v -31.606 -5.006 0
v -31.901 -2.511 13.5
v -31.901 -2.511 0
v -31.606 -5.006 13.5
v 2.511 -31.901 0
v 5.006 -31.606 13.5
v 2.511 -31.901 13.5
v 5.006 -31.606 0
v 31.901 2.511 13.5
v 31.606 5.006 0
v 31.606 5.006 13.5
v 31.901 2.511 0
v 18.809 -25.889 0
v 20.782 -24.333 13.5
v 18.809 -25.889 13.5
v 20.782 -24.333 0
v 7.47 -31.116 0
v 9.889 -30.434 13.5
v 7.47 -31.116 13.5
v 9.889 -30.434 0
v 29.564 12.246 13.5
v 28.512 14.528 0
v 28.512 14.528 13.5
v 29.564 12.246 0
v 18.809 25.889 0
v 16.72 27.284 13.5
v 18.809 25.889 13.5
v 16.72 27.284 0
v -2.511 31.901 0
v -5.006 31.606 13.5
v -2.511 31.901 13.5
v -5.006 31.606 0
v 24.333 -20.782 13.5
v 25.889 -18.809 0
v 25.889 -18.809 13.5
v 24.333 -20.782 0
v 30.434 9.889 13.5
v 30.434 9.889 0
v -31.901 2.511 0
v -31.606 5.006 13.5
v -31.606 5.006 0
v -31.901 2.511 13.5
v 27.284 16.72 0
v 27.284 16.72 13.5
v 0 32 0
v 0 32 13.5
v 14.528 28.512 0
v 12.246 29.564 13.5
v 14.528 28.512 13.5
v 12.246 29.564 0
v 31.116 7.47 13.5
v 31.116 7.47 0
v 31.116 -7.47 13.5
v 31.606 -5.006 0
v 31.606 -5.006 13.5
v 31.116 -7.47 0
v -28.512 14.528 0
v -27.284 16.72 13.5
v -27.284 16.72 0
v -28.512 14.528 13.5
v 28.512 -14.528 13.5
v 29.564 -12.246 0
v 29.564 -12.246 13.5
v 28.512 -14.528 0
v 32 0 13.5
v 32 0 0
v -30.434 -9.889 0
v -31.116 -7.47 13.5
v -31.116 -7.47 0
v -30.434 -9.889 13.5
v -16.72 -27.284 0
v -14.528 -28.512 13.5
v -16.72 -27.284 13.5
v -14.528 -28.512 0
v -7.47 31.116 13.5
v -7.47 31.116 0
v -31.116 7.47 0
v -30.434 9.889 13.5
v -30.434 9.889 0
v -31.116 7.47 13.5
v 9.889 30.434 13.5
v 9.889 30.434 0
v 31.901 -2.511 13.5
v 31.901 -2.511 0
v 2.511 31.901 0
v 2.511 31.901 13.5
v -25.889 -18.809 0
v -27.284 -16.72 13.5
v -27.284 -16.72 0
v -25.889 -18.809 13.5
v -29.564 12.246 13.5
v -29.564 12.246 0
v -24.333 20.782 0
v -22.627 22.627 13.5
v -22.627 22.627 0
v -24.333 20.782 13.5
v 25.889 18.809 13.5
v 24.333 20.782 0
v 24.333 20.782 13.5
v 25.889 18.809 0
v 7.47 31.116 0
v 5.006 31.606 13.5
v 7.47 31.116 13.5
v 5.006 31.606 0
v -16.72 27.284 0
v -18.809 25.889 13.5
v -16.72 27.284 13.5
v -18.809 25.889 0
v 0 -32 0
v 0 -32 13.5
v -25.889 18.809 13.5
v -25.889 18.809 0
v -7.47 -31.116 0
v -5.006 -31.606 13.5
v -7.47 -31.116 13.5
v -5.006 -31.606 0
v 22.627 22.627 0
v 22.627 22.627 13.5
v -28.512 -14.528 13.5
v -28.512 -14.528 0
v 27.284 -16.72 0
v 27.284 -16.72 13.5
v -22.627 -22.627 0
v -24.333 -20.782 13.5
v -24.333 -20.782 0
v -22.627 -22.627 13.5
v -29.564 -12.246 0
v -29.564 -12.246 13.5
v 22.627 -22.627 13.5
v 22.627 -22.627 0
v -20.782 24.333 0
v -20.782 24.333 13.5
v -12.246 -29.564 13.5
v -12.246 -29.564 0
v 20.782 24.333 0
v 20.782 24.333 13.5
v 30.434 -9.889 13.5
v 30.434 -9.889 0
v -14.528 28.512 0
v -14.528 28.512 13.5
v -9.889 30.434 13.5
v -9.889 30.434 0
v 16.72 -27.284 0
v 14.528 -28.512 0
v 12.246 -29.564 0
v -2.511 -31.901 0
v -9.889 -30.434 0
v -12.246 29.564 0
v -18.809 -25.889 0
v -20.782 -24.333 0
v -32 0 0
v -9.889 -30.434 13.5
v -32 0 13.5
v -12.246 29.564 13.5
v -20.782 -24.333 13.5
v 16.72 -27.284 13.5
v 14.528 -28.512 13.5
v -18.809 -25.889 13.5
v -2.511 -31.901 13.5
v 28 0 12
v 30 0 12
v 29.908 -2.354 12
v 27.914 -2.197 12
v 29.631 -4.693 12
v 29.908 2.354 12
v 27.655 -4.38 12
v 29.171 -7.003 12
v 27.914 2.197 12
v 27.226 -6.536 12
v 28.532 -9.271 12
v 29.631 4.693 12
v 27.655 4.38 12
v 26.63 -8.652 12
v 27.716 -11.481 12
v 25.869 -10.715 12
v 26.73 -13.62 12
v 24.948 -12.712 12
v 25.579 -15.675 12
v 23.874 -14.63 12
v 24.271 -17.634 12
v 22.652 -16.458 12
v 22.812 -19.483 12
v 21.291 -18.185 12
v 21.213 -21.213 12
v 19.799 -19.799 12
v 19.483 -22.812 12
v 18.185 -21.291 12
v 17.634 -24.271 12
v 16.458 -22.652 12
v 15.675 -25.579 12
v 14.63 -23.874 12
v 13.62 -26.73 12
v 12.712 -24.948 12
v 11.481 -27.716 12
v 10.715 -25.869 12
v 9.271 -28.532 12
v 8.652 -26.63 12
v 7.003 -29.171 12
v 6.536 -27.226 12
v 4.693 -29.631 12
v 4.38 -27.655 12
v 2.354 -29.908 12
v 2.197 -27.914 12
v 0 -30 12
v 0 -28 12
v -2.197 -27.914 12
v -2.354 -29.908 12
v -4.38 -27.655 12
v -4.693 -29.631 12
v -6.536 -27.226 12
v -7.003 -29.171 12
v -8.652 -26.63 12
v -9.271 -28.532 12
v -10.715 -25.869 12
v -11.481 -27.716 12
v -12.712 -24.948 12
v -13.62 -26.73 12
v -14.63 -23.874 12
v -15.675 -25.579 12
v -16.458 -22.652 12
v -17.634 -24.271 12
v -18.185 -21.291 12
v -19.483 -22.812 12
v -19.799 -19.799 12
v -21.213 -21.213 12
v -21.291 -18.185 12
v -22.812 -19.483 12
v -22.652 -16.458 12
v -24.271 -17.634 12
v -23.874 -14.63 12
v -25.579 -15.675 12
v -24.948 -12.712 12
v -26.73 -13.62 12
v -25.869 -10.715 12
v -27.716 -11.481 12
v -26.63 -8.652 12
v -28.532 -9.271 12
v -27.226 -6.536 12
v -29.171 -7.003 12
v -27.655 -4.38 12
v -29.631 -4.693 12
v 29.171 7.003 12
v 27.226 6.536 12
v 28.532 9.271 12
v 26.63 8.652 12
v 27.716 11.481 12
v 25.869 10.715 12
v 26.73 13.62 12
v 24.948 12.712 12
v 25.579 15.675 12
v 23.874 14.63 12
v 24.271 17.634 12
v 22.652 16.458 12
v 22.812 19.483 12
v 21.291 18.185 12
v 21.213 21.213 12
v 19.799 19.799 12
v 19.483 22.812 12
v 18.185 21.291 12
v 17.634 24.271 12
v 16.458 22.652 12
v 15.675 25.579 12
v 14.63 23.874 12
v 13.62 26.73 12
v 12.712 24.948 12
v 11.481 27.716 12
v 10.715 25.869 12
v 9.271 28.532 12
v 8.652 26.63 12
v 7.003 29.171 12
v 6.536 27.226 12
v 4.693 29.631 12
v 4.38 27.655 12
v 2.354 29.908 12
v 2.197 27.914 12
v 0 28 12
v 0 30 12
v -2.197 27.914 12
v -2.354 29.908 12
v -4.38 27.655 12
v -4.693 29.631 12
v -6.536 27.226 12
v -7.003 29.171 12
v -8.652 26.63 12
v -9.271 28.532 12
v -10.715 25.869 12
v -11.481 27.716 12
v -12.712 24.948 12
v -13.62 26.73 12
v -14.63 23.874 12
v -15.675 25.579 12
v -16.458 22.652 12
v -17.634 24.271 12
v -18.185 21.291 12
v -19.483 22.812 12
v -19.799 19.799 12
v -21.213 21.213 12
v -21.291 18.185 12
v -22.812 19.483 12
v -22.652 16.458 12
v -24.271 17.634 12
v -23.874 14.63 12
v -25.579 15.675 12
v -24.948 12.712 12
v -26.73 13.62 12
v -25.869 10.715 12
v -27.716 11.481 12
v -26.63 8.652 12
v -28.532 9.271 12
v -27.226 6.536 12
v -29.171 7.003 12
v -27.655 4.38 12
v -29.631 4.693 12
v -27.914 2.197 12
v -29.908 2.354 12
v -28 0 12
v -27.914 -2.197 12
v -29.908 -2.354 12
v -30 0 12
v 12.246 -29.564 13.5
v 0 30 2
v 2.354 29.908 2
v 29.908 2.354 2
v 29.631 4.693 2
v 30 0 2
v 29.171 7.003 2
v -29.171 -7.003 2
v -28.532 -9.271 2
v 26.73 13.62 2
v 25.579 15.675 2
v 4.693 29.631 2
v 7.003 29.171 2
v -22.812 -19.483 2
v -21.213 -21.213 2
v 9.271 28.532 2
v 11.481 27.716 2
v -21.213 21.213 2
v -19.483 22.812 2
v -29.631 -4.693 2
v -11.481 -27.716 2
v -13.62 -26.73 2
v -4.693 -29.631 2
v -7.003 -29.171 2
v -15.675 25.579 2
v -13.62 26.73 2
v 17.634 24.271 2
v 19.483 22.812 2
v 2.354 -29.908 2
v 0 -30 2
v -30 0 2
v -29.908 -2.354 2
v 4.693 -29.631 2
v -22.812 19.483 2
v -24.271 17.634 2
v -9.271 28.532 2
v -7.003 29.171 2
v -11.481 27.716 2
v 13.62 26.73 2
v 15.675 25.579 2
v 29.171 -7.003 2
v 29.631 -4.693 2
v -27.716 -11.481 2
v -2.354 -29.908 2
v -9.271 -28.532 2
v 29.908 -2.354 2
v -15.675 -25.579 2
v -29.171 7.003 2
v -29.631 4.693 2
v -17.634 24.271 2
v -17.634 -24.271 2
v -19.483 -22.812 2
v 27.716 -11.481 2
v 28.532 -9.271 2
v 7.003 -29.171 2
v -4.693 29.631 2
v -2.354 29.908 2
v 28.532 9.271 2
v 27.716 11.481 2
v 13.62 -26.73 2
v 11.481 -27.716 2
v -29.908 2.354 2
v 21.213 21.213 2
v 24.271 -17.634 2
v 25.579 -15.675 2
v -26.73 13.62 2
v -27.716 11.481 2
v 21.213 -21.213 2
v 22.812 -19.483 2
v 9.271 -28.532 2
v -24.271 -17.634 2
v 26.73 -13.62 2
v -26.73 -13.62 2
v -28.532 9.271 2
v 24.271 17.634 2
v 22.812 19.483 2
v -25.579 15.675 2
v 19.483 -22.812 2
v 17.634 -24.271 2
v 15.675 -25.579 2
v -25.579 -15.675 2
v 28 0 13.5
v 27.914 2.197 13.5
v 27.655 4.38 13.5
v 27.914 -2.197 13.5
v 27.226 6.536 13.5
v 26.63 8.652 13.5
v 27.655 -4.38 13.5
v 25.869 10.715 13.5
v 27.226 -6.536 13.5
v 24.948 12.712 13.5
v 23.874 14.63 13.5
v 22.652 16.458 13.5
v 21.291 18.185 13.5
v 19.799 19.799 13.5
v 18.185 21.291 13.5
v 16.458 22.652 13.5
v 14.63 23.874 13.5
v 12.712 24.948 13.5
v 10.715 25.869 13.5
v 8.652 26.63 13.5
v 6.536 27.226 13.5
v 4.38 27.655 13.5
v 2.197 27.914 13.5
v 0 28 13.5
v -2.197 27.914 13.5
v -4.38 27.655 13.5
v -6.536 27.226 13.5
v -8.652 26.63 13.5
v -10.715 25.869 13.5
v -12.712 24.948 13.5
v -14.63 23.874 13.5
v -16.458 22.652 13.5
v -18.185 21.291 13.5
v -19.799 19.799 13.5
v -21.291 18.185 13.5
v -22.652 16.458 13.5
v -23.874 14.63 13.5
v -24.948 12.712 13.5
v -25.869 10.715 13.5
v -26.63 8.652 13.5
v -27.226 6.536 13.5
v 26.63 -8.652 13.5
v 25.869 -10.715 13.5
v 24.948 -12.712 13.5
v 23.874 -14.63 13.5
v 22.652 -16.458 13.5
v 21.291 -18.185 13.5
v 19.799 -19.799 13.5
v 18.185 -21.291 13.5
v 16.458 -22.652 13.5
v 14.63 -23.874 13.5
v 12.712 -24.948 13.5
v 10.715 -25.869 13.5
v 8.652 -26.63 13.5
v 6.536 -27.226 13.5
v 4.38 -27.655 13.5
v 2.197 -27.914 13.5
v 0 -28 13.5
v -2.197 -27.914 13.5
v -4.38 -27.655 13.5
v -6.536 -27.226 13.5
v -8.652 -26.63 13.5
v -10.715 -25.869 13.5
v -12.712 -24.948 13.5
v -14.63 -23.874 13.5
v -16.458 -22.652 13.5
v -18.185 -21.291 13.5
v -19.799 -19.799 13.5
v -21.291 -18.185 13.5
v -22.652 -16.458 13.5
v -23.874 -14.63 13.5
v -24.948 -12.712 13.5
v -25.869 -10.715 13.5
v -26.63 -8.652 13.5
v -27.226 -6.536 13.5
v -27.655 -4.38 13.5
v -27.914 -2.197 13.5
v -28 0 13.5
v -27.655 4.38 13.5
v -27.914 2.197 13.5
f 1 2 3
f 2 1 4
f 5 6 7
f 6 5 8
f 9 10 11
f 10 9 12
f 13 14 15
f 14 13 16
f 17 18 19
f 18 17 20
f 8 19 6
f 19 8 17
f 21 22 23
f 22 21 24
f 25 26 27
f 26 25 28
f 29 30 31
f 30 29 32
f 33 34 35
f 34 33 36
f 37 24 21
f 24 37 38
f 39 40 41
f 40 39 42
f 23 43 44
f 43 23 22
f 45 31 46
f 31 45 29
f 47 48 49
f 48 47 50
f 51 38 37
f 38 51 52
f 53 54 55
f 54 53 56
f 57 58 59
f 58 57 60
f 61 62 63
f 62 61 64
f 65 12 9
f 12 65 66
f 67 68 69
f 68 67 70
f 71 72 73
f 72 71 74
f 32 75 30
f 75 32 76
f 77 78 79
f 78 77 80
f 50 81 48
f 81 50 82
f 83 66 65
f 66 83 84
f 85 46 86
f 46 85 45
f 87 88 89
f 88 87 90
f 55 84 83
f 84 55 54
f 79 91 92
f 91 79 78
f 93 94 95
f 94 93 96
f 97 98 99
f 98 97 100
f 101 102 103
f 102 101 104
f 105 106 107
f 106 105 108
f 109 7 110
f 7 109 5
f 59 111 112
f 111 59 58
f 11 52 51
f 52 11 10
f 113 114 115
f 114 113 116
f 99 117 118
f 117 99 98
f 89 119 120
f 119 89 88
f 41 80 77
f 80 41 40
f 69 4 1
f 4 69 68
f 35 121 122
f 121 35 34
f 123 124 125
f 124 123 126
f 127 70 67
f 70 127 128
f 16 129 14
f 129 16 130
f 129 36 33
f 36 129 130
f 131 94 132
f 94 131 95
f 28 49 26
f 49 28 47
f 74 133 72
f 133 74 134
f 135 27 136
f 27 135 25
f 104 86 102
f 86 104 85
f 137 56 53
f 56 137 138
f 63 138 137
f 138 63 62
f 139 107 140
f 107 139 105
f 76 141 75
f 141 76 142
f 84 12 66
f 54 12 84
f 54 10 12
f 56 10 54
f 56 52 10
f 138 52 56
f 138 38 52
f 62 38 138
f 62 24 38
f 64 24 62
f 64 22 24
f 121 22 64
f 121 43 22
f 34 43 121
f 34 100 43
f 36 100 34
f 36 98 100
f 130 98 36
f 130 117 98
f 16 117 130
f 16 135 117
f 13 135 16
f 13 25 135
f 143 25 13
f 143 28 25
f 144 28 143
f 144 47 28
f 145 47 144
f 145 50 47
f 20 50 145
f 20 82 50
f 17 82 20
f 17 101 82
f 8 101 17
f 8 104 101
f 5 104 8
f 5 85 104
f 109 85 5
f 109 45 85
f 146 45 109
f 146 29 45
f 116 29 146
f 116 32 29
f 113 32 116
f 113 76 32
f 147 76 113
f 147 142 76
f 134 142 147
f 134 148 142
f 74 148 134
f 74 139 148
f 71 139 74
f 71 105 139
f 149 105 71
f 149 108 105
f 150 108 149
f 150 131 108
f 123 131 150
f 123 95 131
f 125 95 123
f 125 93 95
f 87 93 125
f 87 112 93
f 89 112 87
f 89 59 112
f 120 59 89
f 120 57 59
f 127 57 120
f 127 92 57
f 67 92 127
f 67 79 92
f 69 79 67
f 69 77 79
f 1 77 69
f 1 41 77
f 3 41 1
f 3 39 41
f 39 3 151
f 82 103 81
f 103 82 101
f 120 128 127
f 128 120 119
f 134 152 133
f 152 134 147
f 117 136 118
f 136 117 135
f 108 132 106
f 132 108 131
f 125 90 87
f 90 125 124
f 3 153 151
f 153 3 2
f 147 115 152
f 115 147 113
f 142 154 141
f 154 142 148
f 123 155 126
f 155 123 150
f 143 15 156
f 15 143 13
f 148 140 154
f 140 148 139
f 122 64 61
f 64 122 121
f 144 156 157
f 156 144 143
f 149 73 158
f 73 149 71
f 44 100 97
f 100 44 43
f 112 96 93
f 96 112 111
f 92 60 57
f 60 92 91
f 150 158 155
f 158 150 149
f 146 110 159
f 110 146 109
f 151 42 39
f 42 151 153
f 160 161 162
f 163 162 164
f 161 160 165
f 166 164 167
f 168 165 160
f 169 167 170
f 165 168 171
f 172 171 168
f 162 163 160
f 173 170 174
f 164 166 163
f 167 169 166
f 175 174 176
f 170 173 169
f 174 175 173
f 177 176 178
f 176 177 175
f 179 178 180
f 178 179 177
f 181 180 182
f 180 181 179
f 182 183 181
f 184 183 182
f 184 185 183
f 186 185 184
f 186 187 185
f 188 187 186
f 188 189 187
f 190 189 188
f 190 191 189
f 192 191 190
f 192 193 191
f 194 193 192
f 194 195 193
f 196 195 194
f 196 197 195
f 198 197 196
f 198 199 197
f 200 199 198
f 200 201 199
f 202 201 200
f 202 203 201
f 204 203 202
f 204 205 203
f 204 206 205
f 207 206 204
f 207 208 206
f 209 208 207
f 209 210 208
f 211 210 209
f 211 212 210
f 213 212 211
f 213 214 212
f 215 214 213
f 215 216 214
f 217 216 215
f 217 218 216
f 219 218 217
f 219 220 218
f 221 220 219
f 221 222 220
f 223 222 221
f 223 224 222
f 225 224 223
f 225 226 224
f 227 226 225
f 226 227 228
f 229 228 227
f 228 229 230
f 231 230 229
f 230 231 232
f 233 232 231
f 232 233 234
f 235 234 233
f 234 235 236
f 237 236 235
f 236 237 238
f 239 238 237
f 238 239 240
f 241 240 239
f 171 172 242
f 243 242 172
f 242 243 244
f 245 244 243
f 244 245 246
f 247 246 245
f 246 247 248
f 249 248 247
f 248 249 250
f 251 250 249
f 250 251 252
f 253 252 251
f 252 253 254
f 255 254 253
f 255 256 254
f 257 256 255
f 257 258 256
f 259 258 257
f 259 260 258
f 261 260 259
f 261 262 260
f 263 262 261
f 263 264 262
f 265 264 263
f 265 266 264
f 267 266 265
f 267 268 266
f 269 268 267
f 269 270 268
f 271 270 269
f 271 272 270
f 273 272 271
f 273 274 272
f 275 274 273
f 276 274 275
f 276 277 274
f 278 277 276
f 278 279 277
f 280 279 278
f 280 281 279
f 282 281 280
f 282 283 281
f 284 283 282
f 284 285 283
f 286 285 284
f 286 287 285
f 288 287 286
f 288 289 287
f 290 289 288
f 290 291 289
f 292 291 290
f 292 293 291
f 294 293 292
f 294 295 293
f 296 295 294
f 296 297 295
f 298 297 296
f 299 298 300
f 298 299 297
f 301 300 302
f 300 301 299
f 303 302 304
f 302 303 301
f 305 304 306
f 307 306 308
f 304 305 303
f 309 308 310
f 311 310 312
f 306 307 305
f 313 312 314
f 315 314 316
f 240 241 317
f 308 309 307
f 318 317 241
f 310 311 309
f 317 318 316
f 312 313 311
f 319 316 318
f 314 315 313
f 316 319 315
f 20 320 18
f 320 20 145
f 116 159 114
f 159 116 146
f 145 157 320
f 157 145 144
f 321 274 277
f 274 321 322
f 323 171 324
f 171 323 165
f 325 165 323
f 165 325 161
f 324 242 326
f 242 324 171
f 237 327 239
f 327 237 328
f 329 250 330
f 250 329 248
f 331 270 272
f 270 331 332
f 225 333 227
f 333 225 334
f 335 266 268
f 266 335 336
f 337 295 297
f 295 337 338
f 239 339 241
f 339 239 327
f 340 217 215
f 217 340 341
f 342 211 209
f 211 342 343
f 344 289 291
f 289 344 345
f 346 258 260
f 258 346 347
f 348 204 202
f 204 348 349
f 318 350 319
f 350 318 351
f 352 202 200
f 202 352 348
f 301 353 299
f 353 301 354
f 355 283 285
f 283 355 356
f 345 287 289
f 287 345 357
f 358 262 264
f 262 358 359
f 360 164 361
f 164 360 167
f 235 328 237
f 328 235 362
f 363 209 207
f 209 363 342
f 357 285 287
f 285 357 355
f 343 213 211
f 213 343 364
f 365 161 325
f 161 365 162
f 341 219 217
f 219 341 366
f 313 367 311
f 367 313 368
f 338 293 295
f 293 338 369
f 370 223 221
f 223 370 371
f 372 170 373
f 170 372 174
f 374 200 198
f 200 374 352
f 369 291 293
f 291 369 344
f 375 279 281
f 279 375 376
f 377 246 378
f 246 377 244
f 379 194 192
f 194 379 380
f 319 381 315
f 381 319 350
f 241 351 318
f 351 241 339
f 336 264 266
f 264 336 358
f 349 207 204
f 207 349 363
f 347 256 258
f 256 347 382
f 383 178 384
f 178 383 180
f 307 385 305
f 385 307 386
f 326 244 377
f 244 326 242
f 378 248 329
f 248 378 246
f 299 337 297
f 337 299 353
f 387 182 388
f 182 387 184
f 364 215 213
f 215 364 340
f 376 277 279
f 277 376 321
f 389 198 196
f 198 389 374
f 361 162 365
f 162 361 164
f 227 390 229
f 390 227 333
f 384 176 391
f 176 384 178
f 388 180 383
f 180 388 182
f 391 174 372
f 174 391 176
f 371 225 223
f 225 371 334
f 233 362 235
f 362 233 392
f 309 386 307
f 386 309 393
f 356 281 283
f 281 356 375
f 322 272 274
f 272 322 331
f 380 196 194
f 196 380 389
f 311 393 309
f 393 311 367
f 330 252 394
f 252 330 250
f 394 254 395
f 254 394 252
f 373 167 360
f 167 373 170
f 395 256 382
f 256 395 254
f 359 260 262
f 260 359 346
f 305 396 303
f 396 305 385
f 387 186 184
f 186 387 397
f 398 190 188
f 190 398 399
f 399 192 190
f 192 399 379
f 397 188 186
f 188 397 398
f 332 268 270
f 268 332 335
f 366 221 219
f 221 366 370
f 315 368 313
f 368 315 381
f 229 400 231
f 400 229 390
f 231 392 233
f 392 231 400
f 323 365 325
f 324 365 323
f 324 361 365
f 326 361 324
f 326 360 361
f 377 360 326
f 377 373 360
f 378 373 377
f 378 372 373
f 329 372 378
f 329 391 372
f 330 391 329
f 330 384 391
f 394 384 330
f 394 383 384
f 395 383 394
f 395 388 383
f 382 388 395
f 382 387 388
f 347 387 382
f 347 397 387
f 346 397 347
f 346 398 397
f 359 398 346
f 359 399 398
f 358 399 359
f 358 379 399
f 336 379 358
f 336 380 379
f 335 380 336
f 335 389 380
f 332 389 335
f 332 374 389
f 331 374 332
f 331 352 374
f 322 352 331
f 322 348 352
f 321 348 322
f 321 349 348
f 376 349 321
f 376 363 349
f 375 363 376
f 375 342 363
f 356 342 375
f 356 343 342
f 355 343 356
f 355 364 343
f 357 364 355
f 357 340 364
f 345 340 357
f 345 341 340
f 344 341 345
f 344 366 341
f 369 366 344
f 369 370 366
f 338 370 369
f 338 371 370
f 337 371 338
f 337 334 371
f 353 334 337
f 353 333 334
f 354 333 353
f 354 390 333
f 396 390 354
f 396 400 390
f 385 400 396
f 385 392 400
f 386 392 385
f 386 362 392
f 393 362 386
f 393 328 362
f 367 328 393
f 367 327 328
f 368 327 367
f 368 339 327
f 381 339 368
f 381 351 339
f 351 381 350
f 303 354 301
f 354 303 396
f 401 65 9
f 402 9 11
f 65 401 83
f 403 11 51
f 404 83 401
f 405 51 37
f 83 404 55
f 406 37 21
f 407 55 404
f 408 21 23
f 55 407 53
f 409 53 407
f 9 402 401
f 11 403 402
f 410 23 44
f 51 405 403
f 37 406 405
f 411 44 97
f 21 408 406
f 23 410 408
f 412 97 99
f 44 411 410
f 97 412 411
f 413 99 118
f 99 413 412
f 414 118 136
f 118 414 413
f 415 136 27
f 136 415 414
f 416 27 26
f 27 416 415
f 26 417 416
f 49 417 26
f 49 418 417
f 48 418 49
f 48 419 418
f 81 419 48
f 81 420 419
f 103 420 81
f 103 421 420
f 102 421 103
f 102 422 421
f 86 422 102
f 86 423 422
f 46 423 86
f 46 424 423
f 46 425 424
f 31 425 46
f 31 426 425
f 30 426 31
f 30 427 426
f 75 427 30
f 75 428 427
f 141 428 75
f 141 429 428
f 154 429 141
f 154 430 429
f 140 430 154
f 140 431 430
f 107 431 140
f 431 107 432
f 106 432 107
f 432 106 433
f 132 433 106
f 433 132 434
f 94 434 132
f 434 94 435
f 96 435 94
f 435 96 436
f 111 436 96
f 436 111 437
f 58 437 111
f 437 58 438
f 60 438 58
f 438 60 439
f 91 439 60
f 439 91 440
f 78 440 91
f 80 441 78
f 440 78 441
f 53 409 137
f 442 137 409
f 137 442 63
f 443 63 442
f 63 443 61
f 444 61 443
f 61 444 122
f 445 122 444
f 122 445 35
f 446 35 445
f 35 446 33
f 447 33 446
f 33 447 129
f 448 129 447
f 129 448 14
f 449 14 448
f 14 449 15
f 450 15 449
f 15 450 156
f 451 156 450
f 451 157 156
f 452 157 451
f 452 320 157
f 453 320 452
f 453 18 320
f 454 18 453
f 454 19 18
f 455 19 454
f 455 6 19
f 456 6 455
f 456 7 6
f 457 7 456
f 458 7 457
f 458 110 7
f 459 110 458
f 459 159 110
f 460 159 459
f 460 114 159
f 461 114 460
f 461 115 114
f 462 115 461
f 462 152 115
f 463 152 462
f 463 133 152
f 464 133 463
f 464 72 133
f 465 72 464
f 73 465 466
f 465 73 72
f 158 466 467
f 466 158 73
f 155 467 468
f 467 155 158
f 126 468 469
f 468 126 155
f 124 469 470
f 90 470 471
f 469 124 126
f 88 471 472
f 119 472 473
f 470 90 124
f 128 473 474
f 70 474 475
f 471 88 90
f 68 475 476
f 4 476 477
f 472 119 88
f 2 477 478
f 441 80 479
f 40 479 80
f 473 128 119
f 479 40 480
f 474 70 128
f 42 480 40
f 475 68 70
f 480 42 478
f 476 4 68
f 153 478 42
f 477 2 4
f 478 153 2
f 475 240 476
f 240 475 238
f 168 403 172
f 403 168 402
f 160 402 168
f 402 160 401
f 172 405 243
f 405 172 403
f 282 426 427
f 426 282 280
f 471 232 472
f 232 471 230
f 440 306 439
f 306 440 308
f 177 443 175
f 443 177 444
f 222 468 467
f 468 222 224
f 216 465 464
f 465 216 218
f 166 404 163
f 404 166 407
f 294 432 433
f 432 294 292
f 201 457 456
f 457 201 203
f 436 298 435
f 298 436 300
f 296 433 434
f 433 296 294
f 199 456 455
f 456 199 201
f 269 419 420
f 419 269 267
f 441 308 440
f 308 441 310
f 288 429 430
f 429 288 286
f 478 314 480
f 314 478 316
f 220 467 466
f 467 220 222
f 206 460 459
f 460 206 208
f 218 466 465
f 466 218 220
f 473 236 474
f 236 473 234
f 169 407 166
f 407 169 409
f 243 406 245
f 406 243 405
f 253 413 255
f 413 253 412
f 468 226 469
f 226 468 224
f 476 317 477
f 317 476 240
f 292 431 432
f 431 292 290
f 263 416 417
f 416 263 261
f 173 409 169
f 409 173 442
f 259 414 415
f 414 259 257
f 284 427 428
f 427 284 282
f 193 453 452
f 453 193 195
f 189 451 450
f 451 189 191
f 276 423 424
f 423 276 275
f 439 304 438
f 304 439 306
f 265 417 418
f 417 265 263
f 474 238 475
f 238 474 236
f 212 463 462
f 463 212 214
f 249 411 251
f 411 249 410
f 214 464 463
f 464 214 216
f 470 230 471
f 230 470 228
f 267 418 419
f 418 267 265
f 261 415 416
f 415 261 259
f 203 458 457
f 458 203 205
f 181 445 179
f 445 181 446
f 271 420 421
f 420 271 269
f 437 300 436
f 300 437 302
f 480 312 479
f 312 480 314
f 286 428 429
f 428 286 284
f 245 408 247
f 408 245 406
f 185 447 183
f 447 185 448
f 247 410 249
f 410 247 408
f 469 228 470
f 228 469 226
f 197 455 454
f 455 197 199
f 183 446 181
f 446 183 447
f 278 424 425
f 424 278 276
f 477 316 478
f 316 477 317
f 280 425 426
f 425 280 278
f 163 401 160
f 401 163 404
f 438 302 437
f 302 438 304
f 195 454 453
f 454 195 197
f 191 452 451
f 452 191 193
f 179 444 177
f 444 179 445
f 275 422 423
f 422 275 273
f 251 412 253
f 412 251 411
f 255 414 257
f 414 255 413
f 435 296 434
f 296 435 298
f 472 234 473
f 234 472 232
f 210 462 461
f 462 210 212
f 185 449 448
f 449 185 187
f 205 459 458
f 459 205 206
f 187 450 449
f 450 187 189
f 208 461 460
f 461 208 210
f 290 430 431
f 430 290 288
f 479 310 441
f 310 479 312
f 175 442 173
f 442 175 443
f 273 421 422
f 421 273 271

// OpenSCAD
// ============================================================
// Orb V2 — LED 光学扩散腔
// 消除 LED 亮点，实现均匀柔光
// ============================================================

// --- 参数 ---
cavity_outer_r = 32;     // 腔体外径
cavity_inner_r = 30;     // 腔体内径
cavity_height  = 12;     // 腔体高度
wall_thick     = 2;      // 壁厚
led_ring_r     = 30;     // LED 环半径
led_count      = 24;     // LED 数量

module led_diffuser() {
    difference() {
        // 外壁
        cylinder(h = cavity_height, r = cavity_outer_r, $fn = 80);

        // 内腔（光混合空间）
        translate([0, 0, wall_thick])
            cylinder(h = cavity_height - wall_thick + 0.1, r = cavity_inner_r, $fn = 80);
    }
}

// LED 环位置标记（辅助对位，不打印）
module led_ring_markers() {
    color("green", 0.5)
    for (i = [0 : led_count - 1]) {
        angle = i * 360 / led_count;
        rotate([0, 0, angle])
            translate([led_ring_r, 0, 0])
                cube([2, 2, 1], center = true);
    }
}

// 二次扩散片支撑环（放在扩散腔顶部）
module diffuser_ring() {
    translate([0, 0, cavity_height])
        difference() {
            cylinder(h = 1.5, r = cavity_outer_r, $fn = 80);
            cylinder(h = 1.6, r = cavity_inner_r - 2, $fn = 80);
        }
}

led_diffuser();
diffuser_ring();
// %led_ring_markers();  // 取消注释可显示 LED 位置
